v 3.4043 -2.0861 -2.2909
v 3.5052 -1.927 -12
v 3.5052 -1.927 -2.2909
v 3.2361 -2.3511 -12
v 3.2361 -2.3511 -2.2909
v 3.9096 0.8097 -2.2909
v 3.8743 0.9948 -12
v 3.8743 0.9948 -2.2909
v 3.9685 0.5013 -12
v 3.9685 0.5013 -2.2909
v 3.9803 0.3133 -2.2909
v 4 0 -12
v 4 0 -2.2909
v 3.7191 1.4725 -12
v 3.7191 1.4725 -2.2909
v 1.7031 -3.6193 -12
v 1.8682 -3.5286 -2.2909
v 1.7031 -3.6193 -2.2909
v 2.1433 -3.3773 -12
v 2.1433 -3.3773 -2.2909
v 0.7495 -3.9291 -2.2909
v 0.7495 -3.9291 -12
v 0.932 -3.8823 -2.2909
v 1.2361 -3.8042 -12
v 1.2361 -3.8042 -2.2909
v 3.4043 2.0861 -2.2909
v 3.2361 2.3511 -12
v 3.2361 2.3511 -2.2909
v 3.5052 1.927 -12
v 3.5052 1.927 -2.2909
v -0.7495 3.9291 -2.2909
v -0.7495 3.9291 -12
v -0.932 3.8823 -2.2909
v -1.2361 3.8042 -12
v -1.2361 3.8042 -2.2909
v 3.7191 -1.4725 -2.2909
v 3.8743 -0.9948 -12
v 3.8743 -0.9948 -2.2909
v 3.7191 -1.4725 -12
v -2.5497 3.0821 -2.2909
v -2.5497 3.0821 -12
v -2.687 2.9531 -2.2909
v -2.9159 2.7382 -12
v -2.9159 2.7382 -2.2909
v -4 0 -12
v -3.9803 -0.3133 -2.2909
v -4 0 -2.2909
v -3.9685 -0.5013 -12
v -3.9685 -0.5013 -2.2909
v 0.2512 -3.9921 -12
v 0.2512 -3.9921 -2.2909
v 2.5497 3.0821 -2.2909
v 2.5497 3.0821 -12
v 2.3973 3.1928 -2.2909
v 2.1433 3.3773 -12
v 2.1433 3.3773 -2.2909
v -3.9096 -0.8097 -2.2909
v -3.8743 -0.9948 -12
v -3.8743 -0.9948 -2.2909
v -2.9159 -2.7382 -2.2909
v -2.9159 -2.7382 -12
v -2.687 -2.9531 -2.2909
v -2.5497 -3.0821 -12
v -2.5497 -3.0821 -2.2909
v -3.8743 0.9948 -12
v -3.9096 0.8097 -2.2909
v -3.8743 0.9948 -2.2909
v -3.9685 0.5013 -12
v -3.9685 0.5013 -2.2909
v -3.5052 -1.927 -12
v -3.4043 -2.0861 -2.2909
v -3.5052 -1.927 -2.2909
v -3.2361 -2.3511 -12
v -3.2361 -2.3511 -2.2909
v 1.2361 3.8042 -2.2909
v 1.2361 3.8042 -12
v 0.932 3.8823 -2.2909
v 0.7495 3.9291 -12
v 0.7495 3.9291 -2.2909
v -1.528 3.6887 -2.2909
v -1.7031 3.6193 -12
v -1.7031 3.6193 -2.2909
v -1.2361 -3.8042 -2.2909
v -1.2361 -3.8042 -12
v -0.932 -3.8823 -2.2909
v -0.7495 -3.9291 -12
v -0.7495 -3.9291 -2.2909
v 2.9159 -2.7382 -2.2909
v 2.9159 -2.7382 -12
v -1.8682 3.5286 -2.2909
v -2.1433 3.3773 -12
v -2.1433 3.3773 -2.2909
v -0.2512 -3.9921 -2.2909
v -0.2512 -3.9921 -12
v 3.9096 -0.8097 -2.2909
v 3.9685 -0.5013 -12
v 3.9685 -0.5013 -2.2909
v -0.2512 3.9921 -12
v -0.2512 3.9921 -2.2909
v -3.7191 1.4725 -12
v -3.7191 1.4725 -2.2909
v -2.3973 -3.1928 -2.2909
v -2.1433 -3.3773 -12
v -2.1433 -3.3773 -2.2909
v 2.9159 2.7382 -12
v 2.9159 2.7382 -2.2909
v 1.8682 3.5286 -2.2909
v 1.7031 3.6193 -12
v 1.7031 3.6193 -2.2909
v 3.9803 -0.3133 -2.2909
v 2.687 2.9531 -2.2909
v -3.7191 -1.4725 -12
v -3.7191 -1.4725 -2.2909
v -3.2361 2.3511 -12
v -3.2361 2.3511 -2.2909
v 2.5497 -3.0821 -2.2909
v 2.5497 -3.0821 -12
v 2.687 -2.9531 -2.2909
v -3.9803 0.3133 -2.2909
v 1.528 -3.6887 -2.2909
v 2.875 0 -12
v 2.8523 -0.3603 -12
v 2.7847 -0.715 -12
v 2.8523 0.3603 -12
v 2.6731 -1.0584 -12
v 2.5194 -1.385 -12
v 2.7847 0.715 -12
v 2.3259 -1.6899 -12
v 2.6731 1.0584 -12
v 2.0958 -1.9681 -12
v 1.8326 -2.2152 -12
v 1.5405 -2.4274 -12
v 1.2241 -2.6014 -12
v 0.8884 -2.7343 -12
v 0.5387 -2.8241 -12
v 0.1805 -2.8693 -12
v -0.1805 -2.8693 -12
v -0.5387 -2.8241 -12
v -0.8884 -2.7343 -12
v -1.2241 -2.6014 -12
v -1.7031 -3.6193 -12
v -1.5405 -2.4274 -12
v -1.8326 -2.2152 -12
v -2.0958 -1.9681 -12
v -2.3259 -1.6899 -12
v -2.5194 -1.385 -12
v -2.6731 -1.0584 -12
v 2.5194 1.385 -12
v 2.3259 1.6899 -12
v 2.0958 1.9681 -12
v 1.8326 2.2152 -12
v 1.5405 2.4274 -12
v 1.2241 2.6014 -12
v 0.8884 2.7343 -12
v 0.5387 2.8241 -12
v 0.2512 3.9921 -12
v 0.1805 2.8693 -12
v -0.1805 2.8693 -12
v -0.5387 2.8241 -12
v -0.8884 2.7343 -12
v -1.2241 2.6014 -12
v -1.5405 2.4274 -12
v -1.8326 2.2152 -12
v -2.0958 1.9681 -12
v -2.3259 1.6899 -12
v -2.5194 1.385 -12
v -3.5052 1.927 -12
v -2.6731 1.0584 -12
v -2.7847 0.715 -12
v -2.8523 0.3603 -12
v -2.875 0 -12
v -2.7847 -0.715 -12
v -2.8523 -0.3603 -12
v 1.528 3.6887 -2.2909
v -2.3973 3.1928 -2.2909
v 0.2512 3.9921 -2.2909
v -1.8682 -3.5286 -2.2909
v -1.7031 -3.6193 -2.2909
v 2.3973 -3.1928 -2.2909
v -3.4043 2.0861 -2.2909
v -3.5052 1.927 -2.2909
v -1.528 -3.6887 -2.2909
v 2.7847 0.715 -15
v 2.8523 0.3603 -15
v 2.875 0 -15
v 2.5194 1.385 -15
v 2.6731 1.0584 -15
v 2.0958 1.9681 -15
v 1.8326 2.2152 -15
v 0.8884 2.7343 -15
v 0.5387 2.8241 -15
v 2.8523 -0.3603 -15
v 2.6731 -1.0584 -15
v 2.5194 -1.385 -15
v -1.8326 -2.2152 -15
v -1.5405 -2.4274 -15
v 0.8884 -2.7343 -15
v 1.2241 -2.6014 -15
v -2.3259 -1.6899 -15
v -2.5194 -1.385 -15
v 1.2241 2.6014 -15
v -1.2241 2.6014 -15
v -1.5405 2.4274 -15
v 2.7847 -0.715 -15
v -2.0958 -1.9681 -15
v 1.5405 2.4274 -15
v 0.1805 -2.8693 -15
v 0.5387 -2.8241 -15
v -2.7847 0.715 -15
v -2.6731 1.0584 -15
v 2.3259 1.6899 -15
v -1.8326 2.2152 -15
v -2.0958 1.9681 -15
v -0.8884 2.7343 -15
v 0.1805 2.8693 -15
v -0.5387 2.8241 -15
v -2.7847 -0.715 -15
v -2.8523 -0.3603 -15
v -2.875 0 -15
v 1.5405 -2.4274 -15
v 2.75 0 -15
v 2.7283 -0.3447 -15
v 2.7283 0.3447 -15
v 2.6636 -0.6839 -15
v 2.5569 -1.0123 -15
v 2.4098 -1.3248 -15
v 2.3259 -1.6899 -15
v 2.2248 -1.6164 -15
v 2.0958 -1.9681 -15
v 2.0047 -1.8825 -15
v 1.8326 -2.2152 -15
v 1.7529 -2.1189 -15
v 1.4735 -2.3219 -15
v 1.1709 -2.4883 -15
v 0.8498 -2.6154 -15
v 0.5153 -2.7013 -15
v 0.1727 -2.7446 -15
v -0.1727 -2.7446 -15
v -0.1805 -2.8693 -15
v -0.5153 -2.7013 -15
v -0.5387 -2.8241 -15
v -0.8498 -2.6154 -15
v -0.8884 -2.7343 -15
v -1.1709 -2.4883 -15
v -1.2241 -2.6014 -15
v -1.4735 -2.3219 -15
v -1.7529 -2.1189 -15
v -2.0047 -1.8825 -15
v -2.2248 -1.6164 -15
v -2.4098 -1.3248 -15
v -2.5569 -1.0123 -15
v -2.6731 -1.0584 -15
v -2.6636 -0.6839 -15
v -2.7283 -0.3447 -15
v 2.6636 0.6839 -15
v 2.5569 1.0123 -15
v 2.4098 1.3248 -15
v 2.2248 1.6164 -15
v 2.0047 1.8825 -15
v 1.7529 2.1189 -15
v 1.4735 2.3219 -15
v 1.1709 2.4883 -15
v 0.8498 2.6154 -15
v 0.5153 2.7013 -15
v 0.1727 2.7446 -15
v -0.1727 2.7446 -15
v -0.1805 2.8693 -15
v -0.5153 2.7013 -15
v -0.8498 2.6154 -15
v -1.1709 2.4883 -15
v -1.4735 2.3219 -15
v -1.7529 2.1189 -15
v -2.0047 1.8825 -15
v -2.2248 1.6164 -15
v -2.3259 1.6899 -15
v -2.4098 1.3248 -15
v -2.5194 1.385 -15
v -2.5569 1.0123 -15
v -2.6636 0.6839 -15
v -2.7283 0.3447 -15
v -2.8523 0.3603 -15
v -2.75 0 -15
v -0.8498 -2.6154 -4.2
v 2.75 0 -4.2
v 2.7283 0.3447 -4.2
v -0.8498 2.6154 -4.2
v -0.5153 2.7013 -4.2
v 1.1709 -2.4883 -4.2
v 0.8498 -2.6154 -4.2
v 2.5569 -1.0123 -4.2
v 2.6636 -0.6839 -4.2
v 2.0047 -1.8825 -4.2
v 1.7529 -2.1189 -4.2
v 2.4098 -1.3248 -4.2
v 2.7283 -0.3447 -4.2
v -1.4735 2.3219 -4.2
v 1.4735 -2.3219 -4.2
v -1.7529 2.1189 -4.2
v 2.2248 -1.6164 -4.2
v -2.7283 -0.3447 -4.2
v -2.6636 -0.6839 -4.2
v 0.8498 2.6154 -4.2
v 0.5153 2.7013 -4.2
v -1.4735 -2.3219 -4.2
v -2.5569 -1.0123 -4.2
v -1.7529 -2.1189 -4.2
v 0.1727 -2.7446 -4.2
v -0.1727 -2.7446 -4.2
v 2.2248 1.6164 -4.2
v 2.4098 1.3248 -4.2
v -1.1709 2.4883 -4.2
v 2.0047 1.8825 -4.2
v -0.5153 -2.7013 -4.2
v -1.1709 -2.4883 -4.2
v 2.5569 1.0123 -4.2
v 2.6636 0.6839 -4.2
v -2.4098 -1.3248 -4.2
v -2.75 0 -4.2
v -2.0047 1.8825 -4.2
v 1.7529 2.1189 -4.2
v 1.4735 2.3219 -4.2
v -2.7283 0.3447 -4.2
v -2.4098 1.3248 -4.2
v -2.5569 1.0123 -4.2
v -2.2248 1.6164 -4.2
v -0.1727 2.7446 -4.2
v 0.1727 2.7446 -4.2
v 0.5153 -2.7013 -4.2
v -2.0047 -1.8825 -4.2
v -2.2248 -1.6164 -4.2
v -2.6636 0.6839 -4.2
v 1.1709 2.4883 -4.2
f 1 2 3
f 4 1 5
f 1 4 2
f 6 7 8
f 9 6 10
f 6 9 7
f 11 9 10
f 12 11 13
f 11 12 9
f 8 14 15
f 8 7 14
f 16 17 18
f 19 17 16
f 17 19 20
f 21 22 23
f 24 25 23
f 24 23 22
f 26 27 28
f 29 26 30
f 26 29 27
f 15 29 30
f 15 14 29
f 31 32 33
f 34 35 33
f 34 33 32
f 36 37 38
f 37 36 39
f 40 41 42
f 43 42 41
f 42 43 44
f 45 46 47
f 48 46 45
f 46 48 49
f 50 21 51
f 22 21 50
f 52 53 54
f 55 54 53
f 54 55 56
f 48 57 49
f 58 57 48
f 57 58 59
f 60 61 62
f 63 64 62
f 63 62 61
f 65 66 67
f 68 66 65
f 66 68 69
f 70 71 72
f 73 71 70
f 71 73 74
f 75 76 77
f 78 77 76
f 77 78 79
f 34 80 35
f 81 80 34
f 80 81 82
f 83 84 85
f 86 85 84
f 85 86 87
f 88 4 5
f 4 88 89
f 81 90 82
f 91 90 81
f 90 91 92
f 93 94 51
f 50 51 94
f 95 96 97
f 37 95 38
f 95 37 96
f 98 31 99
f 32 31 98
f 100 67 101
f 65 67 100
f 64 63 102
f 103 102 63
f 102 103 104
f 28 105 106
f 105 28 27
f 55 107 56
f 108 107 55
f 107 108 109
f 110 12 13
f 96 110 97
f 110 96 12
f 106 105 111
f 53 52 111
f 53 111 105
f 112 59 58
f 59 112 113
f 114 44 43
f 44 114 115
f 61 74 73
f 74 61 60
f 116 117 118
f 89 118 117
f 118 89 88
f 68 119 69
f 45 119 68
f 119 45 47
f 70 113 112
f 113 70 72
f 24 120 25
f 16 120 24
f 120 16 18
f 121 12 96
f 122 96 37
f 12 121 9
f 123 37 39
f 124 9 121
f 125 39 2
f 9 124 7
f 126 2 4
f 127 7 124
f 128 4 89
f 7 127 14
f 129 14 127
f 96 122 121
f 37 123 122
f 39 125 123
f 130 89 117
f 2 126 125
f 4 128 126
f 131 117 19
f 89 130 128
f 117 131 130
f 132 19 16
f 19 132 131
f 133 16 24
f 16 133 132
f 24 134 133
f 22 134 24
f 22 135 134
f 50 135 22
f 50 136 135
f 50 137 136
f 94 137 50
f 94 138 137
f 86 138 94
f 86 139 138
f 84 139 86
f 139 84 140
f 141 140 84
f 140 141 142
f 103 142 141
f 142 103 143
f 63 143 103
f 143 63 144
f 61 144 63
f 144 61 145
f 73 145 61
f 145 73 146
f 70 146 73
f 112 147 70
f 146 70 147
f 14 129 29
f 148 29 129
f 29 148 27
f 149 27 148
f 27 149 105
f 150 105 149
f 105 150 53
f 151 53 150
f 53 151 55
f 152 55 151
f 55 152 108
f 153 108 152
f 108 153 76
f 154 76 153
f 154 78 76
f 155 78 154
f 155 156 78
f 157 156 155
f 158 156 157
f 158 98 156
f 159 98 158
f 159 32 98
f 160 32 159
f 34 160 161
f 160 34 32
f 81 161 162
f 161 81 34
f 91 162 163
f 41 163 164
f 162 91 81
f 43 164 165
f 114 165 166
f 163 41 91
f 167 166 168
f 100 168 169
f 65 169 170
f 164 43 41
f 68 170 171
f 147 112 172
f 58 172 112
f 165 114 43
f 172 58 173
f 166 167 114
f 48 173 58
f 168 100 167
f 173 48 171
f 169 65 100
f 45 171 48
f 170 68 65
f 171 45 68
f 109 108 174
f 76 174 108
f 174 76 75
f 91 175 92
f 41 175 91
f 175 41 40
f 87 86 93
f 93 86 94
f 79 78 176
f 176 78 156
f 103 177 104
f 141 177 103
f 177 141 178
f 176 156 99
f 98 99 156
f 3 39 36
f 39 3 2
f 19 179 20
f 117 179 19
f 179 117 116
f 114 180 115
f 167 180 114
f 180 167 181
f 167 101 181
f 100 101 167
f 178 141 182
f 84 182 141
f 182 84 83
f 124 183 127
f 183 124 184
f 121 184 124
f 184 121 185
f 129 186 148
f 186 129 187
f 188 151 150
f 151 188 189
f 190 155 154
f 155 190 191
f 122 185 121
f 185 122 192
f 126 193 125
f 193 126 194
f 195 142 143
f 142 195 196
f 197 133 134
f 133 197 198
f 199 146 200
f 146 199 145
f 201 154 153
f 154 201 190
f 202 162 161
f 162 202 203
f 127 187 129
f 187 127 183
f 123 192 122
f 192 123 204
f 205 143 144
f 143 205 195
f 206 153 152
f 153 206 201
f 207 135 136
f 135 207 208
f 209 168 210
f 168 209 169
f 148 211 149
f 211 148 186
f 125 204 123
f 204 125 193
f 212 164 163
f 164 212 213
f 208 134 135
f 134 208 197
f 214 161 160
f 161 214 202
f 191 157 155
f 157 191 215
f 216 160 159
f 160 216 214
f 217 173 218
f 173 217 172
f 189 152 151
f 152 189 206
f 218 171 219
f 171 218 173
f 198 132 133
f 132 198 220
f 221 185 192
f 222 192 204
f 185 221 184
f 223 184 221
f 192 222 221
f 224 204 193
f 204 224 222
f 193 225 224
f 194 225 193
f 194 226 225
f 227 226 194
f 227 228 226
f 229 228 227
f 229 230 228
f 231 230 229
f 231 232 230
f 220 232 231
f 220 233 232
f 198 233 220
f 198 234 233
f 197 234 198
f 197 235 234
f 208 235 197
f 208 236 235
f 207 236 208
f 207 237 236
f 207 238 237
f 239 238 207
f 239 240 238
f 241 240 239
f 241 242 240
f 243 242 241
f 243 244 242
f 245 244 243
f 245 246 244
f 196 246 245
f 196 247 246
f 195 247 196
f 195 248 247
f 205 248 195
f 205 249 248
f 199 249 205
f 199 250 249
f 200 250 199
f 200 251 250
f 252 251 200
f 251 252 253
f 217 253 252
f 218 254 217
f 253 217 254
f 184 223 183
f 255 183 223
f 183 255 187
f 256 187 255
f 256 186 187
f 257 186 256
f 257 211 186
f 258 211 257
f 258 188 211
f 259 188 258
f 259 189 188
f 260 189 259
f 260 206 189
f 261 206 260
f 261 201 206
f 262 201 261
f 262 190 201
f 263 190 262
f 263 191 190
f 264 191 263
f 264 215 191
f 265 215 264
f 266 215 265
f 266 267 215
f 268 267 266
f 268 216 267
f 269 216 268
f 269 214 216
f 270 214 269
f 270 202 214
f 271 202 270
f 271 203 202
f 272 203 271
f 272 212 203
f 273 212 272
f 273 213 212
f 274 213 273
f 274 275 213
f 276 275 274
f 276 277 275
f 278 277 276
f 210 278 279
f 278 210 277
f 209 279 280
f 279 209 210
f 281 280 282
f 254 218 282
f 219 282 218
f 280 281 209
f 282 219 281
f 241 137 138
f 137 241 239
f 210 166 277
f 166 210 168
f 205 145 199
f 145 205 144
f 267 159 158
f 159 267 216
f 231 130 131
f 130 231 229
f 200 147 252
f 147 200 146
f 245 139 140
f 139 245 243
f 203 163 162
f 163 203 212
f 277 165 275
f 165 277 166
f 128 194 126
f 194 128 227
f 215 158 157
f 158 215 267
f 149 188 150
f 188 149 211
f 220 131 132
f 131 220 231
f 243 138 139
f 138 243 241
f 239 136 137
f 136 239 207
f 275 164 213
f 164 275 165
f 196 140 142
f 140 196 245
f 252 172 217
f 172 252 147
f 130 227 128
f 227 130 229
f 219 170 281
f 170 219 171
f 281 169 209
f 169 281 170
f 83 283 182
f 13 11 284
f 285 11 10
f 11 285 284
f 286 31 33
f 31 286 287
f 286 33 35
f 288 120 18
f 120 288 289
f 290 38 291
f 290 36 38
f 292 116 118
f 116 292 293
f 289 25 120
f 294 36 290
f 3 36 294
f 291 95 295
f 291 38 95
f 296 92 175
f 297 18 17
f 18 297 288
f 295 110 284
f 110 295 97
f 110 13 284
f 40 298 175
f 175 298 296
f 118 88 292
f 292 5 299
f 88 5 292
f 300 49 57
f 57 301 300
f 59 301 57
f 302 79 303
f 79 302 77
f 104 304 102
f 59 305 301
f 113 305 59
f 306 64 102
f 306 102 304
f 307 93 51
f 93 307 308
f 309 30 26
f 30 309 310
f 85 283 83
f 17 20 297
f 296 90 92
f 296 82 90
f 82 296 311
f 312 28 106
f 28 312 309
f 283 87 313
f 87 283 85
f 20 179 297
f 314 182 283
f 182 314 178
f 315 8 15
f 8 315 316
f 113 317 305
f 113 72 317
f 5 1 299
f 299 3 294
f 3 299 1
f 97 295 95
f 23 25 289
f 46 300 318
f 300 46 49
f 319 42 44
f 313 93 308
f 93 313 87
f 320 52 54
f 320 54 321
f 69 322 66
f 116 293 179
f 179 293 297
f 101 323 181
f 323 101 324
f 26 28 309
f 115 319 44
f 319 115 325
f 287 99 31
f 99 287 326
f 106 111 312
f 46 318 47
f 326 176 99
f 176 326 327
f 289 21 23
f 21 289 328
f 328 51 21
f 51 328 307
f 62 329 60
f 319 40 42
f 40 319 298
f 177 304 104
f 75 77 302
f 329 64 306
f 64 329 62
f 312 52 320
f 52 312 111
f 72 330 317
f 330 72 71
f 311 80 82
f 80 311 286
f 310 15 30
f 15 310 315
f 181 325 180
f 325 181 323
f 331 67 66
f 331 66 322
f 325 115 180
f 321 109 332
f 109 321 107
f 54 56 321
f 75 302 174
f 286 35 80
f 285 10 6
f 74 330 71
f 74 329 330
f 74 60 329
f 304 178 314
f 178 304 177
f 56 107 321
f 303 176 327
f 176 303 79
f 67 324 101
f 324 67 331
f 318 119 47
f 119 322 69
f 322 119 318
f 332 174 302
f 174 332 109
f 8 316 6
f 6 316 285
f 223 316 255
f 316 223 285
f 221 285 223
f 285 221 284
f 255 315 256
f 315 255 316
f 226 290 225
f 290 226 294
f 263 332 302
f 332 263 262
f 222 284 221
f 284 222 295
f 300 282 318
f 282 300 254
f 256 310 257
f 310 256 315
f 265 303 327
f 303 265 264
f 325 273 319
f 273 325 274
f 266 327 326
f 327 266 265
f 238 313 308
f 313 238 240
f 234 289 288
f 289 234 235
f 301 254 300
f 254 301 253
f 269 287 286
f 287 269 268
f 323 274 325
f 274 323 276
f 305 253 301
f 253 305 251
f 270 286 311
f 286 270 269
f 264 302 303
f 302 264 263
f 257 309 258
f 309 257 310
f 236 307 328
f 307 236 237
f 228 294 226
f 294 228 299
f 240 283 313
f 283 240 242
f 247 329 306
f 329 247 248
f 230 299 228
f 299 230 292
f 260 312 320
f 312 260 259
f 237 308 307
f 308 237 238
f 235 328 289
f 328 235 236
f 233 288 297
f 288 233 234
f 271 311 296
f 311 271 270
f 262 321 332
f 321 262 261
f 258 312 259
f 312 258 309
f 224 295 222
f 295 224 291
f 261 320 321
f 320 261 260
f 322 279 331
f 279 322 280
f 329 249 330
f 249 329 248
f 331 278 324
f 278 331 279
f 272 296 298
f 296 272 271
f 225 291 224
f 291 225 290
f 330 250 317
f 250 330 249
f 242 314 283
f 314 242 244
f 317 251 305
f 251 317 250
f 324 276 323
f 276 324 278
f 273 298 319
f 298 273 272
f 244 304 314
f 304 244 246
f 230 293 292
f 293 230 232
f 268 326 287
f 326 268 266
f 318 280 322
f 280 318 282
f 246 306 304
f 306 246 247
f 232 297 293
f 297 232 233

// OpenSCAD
$fn = 50;

difference() {
	union() {
		translate(v = [0, 0, -12.0]) {
			cylinder(h = 12, r = 4.0);
		}
		#translate(v = [0, 0, -15.0]) {
			cylinder(h = 15, r = 2.875);
		}
	}
	union() {
		translate(v = [0, 0, 0]) {
			rotate(a = [0, 0, 0]) {
				difference() {
					union() {
						translate(v = [0, 0, -15.0]) {
							cylinder(h = 15, r = 2.25);
						}
						translate(v = [0, 0, -4.2]) {
							cylinder(h = 4.2, r1 = 2.75, r2 = 5.5);
						}
						translate(v = [0, 0, -15.0]) {
							cylinder(h = 15, r = 2.75);
						}
						translate(v = [0, 0, -15.0]) {
							cylinder(h = 15, r = 2.25);
						}
					}
					union();
				}
			}
		}
	}
}
